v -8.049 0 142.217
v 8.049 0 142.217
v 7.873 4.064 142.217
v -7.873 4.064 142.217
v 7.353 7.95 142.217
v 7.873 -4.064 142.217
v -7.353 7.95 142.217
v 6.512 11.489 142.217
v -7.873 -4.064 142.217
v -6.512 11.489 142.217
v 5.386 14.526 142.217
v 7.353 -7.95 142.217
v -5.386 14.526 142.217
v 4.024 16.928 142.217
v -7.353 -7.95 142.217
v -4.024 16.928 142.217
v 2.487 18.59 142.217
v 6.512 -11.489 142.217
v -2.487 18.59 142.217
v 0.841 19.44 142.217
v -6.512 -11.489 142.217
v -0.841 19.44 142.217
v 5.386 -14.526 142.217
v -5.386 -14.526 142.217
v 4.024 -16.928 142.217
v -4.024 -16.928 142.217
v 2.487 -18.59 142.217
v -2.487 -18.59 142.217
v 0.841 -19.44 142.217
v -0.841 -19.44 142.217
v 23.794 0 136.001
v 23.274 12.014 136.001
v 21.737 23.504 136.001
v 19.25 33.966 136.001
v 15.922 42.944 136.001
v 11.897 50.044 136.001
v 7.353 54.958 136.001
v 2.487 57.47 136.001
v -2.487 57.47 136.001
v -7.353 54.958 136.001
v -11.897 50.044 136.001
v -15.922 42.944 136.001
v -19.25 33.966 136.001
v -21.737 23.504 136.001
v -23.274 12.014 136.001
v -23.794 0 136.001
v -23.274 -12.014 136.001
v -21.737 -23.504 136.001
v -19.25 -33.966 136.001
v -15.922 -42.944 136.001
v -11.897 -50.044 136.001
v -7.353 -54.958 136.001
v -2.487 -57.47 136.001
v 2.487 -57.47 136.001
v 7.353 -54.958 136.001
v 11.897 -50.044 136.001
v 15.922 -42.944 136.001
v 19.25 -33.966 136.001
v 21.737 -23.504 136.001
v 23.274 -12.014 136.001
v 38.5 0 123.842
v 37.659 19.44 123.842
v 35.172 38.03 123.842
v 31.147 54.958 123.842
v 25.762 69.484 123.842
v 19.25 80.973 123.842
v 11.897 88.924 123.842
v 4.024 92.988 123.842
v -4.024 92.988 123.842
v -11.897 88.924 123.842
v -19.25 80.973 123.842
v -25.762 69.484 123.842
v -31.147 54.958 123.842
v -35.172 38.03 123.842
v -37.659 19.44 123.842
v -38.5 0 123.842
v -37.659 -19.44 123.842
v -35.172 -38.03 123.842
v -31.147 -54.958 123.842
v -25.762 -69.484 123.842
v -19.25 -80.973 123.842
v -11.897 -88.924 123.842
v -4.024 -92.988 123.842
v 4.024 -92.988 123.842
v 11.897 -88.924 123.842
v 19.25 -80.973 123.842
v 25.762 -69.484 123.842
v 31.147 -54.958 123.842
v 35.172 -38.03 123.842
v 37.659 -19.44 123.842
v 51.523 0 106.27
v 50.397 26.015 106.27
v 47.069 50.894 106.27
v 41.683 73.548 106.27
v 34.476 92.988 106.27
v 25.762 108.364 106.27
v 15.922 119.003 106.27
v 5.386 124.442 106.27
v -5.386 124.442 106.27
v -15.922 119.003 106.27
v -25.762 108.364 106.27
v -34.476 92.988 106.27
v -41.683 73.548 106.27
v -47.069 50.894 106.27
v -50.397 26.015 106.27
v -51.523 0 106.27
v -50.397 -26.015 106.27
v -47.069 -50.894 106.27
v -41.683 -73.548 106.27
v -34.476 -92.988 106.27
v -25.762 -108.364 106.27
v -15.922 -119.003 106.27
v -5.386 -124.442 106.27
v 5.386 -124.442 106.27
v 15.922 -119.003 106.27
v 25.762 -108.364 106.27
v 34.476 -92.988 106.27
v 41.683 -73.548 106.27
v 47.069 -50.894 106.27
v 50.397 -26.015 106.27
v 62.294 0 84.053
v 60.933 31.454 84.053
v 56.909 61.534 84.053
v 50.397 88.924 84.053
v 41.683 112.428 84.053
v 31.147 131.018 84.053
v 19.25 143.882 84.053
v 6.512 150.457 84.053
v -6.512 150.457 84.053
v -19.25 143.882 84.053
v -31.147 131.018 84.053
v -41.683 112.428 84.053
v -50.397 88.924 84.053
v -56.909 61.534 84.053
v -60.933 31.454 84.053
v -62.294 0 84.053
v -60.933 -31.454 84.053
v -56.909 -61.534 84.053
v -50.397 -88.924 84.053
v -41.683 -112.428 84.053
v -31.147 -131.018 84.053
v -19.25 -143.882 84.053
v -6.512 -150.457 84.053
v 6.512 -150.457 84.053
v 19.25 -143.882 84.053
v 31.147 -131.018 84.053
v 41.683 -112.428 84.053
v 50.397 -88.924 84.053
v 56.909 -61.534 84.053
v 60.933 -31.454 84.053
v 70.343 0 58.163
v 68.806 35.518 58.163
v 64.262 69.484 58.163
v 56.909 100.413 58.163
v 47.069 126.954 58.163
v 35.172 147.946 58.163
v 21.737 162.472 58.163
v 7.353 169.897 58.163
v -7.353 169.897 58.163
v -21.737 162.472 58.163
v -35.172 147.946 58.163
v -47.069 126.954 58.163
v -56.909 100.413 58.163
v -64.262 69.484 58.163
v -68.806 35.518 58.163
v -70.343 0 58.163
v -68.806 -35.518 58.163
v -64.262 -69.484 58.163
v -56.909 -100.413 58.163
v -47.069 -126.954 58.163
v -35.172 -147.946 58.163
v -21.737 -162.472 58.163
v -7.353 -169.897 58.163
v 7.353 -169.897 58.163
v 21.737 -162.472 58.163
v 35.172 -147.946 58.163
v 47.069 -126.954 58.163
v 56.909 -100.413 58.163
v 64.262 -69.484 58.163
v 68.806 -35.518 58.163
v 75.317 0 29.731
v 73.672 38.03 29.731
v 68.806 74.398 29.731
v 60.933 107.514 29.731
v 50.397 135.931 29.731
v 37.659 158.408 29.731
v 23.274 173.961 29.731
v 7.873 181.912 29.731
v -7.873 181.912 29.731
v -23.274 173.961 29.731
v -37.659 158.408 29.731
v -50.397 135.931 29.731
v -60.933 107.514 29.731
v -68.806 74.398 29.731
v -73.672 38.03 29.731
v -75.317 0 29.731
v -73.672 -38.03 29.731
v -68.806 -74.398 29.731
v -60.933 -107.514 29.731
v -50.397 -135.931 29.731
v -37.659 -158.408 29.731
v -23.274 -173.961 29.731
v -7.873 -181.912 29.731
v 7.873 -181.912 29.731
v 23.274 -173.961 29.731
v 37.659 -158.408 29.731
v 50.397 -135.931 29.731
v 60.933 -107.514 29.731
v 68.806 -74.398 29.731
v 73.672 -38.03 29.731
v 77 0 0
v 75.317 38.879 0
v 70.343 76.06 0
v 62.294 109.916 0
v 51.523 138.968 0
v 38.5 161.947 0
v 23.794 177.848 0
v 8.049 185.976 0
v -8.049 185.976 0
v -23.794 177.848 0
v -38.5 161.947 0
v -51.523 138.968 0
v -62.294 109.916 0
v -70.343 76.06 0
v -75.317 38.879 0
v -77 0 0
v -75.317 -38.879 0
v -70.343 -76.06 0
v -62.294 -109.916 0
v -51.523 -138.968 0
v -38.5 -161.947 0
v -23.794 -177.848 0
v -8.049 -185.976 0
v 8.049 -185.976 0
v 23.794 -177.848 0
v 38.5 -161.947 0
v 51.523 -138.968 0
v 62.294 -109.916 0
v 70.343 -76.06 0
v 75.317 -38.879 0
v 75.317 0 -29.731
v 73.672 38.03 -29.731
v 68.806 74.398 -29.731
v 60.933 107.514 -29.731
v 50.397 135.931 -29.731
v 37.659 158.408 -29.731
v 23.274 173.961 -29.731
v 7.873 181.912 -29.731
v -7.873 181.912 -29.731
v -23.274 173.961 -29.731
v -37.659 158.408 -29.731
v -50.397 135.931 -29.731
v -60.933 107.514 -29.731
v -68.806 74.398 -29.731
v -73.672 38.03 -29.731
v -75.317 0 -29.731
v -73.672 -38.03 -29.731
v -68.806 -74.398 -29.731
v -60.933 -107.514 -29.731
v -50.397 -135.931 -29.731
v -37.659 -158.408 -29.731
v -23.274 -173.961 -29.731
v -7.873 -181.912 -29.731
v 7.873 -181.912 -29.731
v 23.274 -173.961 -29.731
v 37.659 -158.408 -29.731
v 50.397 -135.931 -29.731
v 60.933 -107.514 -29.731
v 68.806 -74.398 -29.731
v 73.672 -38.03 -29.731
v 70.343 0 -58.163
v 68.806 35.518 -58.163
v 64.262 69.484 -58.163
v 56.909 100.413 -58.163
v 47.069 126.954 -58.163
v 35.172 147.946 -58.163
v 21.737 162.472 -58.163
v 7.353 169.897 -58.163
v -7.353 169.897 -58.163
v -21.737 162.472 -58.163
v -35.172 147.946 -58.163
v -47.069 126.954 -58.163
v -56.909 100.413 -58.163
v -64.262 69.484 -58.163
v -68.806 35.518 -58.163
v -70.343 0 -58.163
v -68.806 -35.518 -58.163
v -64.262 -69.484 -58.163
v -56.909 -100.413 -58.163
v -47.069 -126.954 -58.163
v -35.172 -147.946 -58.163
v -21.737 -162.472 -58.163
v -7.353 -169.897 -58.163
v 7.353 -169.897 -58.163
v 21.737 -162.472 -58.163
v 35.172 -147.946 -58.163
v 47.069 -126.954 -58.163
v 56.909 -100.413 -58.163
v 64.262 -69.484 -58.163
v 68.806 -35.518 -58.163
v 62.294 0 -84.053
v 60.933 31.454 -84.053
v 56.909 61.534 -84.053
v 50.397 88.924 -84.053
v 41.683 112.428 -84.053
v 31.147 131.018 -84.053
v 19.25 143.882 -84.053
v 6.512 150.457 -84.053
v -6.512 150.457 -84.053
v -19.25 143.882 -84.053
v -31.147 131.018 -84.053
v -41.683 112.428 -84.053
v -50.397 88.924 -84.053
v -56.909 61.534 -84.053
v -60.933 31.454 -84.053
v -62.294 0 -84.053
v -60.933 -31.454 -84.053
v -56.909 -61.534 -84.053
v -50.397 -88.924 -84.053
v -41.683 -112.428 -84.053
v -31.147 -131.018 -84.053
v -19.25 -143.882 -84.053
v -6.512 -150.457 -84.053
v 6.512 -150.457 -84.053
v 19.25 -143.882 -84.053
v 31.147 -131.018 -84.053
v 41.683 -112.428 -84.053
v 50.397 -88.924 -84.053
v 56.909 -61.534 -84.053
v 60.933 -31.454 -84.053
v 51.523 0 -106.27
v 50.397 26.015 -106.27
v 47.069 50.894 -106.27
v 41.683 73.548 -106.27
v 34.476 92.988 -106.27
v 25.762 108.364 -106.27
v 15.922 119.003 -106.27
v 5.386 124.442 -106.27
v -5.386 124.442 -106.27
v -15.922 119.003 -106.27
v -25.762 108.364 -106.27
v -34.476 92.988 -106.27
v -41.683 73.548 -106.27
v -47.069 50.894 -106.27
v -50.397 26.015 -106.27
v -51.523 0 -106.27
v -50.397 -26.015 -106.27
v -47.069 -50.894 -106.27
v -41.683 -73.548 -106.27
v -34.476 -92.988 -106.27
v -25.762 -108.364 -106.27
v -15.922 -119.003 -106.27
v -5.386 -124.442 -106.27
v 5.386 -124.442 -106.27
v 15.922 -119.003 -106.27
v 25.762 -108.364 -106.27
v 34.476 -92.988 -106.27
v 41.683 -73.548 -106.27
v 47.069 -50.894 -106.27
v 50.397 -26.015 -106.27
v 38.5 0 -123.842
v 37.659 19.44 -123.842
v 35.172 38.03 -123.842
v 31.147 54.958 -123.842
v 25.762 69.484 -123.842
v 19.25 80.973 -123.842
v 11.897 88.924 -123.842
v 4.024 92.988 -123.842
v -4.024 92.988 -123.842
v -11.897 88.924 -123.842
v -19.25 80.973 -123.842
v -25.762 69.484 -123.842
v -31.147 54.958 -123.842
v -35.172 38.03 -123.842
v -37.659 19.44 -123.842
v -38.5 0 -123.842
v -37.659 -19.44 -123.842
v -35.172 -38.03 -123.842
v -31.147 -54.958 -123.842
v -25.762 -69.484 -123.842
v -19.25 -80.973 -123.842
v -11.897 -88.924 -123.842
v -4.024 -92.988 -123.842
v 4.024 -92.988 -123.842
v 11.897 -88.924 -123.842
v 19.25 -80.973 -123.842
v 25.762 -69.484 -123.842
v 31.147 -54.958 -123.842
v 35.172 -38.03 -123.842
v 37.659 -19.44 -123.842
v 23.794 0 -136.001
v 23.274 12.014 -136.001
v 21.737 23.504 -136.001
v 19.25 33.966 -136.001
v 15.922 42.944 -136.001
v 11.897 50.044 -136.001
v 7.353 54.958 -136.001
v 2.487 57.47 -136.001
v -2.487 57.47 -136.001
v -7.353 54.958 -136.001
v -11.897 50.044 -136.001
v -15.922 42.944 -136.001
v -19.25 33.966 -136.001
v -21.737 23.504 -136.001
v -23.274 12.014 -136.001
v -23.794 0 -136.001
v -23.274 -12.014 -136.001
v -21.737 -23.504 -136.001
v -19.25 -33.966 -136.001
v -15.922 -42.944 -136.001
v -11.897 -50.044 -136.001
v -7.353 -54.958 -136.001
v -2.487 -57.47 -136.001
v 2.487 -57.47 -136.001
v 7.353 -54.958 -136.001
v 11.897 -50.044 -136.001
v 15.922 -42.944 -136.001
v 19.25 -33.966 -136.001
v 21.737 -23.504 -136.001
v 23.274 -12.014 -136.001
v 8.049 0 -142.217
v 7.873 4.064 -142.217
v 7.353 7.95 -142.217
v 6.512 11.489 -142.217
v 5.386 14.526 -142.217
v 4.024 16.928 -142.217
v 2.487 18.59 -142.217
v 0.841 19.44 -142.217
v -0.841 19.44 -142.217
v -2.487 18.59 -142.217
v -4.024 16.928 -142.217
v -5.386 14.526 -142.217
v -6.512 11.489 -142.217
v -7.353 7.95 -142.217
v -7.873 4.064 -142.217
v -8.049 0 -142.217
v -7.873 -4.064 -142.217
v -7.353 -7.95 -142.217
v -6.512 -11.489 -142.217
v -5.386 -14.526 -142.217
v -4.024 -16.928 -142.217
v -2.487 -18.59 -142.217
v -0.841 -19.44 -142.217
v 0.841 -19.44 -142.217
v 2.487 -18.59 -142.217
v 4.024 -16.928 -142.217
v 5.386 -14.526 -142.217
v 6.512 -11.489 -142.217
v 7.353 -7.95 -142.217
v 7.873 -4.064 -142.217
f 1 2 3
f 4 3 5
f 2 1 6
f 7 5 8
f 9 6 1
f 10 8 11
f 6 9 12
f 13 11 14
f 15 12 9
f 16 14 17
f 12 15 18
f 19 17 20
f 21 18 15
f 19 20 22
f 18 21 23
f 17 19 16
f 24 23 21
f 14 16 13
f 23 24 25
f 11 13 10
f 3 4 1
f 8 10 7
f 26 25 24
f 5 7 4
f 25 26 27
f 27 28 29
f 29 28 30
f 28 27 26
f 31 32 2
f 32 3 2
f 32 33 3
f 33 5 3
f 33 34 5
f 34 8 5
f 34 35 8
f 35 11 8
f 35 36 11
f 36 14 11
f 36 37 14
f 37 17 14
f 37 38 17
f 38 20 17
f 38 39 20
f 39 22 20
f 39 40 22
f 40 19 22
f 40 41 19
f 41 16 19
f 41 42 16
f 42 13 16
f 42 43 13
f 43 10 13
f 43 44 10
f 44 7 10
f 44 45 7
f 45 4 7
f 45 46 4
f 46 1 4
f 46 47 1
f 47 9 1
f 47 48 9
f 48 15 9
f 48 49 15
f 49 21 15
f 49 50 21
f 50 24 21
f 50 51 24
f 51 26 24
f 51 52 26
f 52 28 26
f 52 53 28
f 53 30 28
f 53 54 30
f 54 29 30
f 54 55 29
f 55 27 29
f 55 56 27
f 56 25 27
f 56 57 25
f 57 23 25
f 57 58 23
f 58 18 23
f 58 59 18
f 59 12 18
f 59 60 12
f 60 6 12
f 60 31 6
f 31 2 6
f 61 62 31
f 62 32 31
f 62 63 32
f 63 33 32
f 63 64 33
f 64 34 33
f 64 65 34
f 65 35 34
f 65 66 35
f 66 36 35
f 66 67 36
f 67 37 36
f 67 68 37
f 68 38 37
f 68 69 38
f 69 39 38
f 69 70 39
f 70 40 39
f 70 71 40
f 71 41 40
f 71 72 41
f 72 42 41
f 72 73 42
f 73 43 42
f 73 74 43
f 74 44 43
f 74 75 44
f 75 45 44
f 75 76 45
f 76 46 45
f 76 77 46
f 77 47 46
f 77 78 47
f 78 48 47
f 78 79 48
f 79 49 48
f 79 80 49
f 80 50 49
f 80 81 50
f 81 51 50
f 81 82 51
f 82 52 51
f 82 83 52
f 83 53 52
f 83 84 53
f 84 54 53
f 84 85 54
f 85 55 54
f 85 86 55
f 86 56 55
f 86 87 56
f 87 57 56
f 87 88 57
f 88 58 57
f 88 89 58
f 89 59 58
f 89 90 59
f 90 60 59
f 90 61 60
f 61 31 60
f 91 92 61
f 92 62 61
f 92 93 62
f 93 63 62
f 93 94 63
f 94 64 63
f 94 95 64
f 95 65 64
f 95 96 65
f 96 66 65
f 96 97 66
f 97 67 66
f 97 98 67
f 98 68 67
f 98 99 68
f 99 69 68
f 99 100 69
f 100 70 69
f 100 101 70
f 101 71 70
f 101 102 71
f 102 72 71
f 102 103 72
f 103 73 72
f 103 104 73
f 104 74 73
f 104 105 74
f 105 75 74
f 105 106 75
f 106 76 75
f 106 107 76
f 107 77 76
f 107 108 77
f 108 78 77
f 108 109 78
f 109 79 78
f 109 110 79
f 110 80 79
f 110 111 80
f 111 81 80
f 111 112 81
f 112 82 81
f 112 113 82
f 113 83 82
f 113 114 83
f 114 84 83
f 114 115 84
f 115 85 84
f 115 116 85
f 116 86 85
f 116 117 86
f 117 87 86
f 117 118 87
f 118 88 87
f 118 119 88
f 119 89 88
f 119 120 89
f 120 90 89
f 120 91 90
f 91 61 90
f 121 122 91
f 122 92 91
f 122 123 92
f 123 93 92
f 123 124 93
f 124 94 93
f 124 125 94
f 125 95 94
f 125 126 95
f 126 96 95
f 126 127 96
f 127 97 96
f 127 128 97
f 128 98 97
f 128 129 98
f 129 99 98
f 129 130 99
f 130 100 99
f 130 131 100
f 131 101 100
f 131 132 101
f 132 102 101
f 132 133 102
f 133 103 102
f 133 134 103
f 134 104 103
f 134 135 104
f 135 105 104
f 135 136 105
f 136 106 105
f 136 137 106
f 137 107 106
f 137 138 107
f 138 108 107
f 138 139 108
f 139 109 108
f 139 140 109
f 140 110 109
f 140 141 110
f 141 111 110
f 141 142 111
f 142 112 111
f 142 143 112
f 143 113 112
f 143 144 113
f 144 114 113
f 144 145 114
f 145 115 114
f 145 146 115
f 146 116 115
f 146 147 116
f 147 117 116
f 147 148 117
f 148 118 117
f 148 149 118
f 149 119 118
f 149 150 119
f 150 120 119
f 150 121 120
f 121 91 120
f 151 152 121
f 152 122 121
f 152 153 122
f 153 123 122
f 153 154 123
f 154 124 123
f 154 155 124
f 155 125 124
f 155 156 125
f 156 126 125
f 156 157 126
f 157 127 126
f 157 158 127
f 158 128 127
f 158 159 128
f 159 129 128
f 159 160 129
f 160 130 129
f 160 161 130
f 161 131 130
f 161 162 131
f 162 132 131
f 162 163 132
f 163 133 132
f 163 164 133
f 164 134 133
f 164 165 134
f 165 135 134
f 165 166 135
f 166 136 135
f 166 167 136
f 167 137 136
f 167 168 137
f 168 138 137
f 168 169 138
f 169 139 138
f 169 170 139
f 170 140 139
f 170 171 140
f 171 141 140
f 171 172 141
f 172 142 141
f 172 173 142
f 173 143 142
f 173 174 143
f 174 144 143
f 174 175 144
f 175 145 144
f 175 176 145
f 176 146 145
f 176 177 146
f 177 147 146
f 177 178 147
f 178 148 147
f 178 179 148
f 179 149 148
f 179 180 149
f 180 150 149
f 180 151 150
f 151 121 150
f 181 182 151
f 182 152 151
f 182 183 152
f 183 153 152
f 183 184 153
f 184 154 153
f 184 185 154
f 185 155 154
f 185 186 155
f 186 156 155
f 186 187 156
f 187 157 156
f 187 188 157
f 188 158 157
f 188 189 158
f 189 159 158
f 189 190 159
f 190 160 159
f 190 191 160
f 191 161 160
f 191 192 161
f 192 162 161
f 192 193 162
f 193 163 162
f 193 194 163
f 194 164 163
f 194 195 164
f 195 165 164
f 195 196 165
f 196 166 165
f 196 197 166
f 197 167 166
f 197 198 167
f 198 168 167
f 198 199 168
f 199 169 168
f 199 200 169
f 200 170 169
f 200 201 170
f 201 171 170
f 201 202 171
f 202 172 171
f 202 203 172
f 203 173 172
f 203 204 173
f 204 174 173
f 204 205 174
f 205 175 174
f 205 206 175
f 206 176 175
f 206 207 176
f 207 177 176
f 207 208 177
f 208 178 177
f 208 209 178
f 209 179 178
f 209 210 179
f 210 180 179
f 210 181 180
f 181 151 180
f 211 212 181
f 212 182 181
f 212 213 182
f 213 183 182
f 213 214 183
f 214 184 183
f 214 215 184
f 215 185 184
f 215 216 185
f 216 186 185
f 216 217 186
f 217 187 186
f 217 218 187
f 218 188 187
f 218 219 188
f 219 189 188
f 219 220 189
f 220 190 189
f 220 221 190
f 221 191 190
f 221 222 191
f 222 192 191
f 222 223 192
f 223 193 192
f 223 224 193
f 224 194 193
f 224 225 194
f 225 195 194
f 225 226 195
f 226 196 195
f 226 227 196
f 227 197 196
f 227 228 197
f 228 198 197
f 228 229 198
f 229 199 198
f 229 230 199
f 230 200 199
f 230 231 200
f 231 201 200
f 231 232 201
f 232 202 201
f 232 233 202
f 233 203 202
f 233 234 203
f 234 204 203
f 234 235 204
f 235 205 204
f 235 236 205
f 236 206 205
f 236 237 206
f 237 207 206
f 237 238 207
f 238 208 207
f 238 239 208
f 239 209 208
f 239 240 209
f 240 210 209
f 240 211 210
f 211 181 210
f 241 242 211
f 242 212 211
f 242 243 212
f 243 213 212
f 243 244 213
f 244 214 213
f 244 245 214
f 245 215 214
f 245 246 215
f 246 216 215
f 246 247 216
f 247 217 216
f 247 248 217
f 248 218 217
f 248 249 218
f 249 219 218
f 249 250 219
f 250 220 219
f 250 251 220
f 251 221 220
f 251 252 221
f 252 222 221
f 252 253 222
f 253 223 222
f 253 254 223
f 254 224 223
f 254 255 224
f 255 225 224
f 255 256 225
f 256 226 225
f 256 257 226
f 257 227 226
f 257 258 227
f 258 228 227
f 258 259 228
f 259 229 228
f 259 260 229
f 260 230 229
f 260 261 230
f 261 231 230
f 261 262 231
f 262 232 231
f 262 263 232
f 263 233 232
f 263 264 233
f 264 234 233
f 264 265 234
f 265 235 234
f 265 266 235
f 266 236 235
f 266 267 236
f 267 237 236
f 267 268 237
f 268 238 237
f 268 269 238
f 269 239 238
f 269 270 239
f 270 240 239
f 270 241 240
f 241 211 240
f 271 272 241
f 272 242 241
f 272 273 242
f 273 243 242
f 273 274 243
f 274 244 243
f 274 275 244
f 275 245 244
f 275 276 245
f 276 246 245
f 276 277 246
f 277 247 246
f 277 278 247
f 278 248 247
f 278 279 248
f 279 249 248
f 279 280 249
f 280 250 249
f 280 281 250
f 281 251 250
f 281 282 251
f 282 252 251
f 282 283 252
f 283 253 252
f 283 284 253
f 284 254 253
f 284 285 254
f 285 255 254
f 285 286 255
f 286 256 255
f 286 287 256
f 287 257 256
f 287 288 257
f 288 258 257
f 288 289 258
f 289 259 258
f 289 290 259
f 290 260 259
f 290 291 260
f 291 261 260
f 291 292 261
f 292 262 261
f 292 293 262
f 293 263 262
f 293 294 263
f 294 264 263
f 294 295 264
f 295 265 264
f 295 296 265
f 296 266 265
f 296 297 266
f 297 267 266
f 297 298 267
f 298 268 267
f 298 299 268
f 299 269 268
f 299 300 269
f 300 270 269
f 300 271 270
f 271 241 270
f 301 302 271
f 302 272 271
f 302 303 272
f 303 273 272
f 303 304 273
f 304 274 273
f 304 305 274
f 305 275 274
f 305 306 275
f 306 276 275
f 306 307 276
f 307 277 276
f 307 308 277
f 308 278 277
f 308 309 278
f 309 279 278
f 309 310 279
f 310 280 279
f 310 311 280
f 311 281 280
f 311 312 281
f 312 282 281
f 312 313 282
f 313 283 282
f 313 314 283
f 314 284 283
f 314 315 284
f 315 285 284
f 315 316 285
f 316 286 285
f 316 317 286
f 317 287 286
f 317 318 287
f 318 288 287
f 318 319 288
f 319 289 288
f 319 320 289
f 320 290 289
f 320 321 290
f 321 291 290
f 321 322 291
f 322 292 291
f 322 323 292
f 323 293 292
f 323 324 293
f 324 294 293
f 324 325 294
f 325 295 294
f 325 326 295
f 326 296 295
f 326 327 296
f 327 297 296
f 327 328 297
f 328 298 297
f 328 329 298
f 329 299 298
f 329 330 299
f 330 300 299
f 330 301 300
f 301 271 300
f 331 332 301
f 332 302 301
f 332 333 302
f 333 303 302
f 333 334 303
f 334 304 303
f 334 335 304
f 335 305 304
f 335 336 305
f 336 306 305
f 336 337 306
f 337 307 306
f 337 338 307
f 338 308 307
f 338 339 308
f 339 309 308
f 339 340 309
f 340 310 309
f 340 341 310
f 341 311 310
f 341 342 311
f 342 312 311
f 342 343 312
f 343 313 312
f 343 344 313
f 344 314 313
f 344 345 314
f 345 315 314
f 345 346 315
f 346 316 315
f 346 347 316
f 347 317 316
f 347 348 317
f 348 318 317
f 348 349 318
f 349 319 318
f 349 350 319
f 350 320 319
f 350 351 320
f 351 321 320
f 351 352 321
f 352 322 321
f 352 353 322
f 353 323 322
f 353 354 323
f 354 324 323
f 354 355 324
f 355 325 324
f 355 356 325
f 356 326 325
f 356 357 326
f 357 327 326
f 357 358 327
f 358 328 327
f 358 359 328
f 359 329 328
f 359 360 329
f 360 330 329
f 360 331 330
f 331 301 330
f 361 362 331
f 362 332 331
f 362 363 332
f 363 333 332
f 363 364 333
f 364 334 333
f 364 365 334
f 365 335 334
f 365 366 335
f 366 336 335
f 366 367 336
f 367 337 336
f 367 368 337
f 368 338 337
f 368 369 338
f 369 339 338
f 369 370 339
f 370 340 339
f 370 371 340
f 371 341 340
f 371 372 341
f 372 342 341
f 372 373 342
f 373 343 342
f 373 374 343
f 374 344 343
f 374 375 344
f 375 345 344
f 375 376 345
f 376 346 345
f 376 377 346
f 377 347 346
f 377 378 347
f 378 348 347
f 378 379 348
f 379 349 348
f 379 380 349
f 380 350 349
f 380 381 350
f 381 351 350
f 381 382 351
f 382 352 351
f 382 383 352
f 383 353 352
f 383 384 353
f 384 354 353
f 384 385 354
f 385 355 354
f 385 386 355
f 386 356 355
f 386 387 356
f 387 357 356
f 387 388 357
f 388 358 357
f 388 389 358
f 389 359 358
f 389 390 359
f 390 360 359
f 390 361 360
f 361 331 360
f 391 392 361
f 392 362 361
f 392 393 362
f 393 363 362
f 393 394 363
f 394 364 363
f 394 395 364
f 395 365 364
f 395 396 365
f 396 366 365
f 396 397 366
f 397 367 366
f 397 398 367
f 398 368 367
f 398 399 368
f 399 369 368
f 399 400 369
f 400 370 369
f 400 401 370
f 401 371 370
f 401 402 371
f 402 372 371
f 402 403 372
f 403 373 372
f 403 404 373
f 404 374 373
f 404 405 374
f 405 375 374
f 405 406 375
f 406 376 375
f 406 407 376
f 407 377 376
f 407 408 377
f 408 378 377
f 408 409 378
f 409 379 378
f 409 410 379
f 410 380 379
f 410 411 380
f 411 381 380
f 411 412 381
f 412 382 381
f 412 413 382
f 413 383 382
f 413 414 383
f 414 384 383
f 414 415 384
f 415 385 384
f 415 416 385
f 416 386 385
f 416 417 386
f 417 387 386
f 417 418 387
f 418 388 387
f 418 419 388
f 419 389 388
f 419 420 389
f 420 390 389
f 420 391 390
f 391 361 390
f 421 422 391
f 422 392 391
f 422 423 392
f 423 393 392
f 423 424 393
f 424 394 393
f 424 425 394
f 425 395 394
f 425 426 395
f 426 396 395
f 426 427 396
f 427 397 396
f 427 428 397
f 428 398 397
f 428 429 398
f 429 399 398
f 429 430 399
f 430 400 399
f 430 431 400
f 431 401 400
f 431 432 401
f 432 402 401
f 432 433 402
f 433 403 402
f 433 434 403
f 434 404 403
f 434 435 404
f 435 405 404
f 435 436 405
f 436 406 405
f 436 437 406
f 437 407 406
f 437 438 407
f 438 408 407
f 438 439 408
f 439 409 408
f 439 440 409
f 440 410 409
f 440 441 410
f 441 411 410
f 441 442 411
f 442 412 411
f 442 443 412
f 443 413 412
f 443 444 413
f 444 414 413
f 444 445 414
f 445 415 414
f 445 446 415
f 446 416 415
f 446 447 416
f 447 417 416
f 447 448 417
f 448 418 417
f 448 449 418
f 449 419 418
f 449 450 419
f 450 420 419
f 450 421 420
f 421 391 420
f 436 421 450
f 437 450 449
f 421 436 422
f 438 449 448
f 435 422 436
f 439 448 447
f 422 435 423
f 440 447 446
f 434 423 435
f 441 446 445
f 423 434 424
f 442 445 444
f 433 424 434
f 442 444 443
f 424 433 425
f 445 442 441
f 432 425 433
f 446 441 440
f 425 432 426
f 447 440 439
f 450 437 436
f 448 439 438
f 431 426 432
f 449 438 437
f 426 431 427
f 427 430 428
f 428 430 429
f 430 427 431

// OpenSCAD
// Generated by SolidPython 1.0.1 on 2020-07-29 00:46:48


scale(v = [7, 17, 13]) {
	sphere(r = 11);
}
/***********************************************
*********      SolidPython code:      **********
************************************************
 
# import packages: SolidPython
from solid import *
from solid.utils import *
from itertools import chain, combinations, permutations


class Resize:

    def __init__(self, scad_file):
        self.scad_file = scad_file
        #self.scad_file = import_scad(scad_file)
        # cone/cylinder param:
        self.r1 = 0
        self.r2 = 0
        self.h = 0
        # rectangular prism param:
        self.w = 0
        self.l = 0
        # ellipse param:
        self.r = 0

    # import OpenScad code (file name corresponds to shape)


    # classify shape + parameters
    def assign(self, param1, param2, param3):
        if self.scad_file == 'cone.scad':
            self.r1 = param1
            self.r2 = param2
            self.h = param3
        elif self.scad_file == 'cylinder.scad':
            self.r1 = param1
            self.r2 = param2
            self.h = param3
        elif self.scad_file == 'rectangularPrism.scad':
            self.h = param1
            self.l = param2
            self.w = param3
        else:
            self.r = param1
            self.h = param2

    # resize parameters
    def iterate(self):
        x = range(3, 20, 2)
        i = 1
        if self.scad_file == 'cone.scad':
            tempList = list(permutations(x, 2))
            for temp in tempList:
                param1 = temp[0]
                param2 = temp[1]
                filepath = 'produced_scad_files/' + 'cone' + str(param1) + '_' + str(param2) + '_' + '.scad'
                scad_render_to_file(cylinder(h=param1, r1=param2, r2=0), filepath)

        elif self.scad_file == 'cylinder.scad':
            tempList = list(permutations(x, 3))
            for temp in tempList:
                param1 = temp[0]
                param2 = temp[1]
                filepath = 'produced_scad_files/' + 'cylinder' + str(param1) + '_' + str(param2) + '_' + '.scad'
                scad_render_to_file(cylinder(h=param1, r1=param2, r2=param2), filepath)

        elif self.scad_file == 'rectangularPrism.scad':
            tempList = list(permutations(x, 3))
            for temp in tempList:
                param1 = temp[0]
                param2 = temp[1]
                param3 = temp[2]
                filepath = 'produced_scad_files/' + 'rectangularPrism' + str(param1) + '_' + str(param2) + '_' + str(
                    param3) + '.scad'
                scad_render_to_file(cube(size=(param1, param2, param3)), filepath)

        elif self.scad_file == 'ellipse.scad':
            tempList = list(permutations(x, 4))
            for temp in tempList:
                param1 = temp[0]
                param2 = temp[1]
                param3 = temp[2]
                param4 = temp[3]
                filepath = 'produced_scad_files/' + 'ellipse' + str(param1) + '_' + str(param2) + '_' + str(param3) + '_' + str(param4) + '.scad'
                scad_render_to_file(scale([param1, param2, param3])(sphere(r=param4)), filepath)

    def render_to_scadfile(self):
        scad_render_to_file(scad, 'example.scad') 
 
************************************************/
